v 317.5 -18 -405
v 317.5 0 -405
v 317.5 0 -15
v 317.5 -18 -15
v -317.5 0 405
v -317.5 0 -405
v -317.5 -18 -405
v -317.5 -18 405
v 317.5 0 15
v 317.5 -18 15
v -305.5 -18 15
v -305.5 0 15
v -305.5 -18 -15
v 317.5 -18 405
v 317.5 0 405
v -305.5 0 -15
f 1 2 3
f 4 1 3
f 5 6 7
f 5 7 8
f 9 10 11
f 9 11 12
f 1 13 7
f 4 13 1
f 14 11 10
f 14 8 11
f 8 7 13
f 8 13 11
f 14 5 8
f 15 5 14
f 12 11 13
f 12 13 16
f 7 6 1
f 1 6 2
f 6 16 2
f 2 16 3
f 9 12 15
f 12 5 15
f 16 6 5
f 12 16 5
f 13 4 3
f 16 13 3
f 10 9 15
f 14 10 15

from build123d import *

# Parameters (mm, degrees)
F0_W     = 635
F0_H     = 810
F1_DEPTH = 18
F2_W     = 18
F2_H     = 30
F3_DEPTH = 623


with BuildPart() as f1:
    # F0 (on Front) → F1 (new body)
    with BuildSketch(Plane.XZ):
        Rectangle(F0_W, F0_H)
    extrude(amount=F1_DEPTH)

    # F2 (on face) → F3 (cut)
    with BuildSketch(Plane.YZ.offset(317.5)):
        with Locations((-9, 0)):
            Rectangle(F2_W, F2_H)
    extrude(amount=-F3_DEPTH, mode=Mode.SUBTRACT)


solid = f1.part
